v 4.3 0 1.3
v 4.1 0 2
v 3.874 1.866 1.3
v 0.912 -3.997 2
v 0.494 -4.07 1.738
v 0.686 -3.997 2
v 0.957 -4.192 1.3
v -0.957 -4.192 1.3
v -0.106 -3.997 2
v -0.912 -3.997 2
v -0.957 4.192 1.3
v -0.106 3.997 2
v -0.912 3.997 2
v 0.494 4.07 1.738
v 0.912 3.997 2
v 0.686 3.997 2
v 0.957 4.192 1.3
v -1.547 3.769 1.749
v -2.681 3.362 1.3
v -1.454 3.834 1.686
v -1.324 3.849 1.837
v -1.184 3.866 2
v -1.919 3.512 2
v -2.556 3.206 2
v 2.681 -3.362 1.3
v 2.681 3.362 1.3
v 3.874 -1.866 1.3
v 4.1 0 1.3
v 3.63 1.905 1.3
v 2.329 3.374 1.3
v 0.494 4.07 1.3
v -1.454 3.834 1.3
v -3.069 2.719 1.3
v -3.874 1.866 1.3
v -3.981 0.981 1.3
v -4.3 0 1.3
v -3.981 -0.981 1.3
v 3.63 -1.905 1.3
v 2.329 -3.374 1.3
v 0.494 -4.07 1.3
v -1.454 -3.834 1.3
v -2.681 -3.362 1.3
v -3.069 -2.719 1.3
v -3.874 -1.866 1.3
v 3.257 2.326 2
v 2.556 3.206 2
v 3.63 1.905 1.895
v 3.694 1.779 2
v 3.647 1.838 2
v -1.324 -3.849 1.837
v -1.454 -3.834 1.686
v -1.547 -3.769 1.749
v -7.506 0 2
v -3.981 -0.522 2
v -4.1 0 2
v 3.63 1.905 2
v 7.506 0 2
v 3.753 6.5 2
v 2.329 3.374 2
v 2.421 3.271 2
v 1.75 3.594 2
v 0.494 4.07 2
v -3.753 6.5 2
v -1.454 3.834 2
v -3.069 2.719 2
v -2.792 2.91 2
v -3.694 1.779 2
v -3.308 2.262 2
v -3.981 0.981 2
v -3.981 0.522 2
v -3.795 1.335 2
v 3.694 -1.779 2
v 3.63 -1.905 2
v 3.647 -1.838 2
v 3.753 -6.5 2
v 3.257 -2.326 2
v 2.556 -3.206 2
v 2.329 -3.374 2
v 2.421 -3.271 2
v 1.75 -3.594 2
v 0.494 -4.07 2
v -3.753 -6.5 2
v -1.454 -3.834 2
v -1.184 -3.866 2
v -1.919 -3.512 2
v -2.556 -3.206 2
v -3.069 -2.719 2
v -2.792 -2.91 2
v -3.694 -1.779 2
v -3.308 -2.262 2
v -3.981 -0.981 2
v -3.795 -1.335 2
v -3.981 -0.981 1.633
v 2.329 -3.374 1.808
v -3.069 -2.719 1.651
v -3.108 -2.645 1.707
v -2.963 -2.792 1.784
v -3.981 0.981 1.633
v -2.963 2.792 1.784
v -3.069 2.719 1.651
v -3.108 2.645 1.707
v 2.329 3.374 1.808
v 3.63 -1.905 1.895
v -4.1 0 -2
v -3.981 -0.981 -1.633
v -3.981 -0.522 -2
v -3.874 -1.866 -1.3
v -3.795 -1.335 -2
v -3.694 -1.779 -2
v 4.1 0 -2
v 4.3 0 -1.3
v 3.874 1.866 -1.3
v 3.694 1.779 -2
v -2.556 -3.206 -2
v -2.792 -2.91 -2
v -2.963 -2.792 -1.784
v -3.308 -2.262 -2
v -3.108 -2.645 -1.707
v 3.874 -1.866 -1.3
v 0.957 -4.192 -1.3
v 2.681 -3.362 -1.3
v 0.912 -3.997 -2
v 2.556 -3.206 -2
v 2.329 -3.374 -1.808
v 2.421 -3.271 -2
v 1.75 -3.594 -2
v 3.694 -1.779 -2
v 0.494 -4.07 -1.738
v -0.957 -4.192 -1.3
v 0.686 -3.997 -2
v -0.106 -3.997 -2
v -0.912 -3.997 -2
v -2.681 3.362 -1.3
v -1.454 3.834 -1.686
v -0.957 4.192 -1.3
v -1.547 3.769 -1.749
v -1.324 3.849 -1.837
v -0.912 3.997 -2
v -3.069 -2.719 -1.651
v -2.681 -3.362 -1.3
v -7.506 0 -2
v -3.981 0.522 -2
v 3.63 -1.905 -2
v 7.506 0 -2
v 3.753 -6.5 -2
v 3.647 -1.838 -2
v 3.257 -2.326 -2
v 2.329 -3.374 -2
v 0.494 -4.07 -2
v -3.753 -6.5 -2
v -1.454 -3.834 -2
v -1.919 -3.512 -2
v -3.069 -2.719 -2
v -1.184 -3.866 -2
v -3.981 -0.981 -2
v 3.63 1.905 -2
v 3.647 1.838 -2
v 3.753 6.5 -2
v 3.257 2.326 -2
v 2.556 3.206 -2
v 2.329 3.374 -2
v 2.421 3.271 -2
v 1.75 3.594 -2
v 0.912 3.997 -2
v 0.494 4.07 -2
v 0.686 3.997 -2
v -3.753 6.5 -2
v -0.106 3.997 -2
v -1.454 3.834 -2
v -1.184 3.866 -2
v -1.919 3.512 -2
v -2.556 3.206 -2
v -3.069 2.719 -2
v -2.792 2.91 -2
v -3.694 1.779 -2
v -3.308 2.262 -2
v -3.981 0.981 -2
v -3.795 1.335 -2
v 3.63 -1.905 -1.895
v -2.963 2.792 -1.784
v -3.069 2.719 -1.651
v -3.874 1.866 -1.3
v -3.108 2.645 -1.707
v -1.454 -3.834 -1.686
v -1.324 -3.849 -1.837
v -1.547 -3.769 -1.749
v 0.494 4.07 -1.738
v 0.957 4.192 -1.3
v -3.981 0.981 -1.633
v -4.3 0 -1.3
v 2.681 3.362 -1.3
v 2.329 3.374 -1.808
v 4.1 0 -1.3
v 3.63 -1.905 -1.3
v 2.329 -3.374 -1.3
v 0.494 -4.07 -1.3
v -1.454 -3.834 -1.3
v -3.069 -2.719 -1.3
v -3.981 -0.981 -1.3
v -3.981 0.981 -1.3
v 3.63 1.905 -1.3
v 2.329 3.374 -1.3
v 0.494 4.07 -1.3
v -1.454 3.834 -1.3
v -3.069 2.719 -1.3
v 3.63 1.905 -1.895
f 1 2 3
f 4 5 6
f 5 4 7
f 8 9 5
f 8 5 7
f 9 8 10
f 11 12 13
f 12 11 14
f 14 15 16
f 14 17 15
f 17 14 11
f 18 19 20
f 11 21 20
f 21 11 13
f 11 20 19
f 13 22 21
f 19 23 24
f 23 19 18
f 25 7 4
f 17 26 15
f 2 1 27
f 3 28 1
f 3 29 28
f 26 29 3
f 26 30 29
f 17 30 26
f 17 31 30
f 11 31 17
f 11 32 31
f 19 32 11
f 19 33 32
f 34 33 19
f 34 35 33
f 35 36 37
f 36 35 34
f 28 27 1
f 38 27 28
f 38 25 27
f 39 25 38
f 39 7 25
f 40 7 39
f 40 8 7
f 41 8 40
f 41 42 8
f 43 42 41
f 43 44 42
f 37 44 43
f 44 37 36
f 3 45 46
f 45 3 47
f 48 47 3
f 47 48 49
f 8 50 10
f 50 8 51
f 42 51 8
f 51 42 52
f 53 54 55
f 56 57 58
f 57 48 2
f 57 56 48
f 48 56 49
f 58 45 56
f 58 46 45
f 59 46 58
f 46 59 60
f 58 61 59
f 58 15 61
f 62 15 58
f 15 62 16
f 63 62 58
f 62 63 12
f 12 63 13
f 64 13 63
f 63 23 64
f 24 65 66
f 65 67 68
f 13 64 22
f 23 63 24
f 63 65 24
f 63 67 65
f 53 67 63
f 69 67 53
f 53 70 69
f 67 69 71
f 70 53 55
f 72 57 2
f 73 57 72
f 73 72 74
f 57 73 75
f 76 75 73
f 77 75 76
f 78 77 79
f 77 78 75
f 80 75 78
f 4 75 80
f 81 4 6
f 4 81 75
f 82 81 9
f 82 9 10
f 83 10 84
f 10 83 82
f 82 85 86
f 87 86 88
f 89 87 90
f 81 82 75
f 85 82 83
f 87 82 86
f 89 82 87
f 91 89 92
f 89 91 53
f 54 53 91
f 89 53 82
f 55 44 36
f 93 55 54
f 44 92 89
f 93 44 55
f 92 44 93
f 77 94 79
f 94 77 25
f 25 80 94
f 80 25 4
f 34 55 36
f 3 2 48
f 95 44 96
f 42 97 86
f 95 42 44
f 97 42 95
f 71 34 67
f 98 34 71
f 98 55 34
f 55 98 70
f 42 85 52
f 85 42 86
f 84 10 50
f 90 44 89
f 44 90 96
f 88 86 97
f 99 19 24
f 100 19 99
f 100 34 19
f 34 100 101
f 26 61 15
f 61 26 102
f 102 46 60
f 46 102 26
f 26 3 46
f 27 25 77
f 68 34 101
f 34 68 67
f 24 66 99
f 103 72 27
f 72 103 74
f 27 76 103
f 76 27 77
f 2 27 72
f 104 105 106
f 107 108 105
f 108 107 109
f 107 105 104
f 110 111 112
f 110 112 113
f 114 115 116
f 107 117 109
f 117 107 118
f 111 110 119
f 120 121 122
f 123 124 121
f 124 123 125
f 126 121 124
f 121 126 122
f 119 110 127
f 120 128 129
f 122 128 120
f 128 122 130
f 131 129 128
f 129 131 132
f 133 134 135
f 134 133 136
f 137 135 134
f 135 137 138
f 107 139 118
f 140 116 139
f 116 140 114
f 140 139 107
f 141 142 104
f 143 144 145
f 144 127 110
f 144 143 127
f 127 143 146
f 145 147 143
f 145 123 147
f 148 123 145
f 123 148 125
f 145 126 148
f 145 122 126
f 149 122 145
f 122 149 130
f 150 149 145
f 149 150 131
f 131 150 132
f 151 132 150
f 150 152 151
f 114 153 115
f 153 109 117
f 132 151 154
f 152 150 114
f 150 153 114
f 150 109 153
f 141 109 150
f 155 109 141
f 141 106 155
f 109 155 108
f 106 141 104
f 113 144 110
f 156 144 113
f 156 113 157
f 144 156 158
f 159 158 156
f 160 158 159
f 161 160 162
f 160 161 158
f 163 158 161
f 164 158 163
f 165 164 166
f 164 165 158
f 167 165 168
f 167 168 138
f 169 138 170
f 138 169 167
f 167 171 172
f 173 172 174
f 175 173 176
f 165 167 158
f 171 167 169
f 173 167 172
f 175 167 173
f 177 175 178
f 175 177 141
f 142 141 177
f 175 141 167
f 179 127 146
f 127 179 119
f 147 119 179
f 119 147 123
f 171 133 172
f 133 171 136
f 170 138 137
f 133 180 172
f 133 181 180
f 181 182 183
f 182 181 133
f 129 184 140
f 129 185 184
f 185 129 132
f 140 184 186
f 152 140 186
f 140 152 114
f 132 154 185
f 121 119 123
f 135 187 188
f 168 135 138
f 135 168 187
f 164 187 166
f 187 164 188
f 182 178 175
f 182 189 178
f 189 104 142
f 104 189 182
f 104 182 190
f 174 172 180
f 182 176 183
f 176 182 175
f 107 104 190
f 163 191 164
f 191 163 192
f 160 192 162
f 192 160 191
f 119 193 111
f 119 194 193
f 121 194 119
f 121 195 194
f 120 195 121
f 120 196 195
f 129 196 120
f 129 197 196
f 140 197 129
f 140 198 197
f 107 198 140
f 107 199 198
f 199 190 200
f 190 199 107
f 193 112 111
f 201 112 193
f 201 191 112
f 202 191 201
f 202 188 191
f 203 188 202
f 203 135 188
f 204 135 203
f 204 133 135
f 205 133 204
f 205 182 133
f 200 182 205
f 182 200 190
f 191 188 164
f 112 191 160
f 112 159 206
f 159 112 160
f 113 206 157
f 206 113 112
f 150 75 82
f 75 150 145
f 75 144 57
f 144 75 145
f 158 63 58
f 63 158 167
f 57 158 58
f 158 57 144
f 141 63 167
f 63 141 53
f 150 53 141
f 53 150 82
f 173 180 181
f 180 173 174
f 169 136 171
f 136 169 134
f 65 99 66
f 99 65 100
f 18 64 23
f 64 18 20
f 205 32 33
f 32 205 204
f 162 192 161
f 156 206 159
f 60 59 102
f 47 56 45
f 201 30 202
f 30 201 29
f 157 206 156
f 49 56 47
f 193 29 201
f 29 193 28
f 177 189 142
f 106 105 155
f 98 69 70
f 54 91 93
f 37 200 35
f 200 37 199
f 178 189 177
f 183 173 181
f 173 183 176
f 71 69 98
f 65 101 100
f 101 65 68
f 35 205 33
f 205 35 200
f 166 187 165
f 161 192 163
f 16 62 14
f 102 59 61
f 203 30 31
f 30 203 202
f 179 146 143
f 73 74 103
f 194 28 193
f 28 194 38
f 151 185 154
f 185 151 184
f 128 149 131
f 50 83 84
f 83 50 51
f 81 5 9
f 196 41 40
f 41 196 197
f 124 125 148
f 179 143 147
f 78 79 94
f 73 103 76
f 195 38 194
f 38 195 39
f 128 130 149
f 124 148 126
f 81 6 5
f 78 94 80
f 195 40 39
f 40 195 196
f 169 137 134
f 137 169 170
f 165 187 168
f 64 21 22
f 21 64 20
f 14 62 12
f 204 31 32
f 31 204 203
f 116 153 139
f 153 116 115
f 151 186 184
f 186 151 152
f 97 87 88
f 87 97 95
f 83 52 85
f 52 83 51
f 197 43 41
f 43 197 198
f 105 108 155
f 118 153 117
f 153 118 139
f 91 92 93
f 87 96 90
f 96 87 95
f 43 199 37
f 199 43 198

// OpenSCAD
// Parameters
thread_nominal_diameter_mm = 8.0; //[4.0:16.0:0.1]
across_flats_mm = 13.0; //[6.5:26.0:0.1]
thickness_mm = 4.0; //[2.0:8.0:0.1]
hole_diameter_mm = 8.0; //[4.0:16.0:0.1]
outer_profile_sides = 6; //[6:6:1]
edge_break_mm = 0.2; //[0.0:0.8:0.05]
tolerance_mm = 0.2; //[0.0:0.6:0.05]
eps_mm = 0.5; //[0.2:2.0:0.1]
hex_circumradius_mm = 7.505553499; //[3.75:15.5:0.01]
hole_radius_mm = 4.1; //[2.0:8.5:0.01]

// Nut and Washer - complete geometry
module nut_and_washer() {
  color("DimGray") {
    difference() {
      // Hex Nut Body
      cylinder(r=across_flats_mm/1.7320508076, h=thickness_mm, center=true, $fn=outer_profile_sides);
      
      // Thread Through Hole
      translate([0, 0, 0])
        cylinder(r=(hole_diameter_mm + tolerance_mm)/2, h=thickness_mm + 2*eps_mm, center=true);
      
      // Chamfer or Edge Break
      union() {
        // Edge Break Top Cone
        translate([0, 0, thickness_mm/2 - (edge_break_mm + eps_mm)/2])
          cylinder(r1=(hole_diameter_mm + tolerance_mm)/2 + edge_break_mm, 
                   r2=(hole_diameter_mm + tolerance_mm)/2, 
                   h=edge_break_mm + eps_mm, center=true);
        
        // Edge Break Bottom Cone
        translate([0, 0, -thickness_mm/2 + (edge_break_mm + eps_mm)/2])
          cylinder(r1=(hole_diameter_mm + tolerance_mm)/2, 
                   r2=(hole_diameter_mm + tolerance_mm)/2 + edge_break_mm, 
                   h=edge_break_mm + eps_mm, center=true);
      }
    }
  }
}

// Assembly
module assembly() {
  nut_and_washer();
}

assembly();
